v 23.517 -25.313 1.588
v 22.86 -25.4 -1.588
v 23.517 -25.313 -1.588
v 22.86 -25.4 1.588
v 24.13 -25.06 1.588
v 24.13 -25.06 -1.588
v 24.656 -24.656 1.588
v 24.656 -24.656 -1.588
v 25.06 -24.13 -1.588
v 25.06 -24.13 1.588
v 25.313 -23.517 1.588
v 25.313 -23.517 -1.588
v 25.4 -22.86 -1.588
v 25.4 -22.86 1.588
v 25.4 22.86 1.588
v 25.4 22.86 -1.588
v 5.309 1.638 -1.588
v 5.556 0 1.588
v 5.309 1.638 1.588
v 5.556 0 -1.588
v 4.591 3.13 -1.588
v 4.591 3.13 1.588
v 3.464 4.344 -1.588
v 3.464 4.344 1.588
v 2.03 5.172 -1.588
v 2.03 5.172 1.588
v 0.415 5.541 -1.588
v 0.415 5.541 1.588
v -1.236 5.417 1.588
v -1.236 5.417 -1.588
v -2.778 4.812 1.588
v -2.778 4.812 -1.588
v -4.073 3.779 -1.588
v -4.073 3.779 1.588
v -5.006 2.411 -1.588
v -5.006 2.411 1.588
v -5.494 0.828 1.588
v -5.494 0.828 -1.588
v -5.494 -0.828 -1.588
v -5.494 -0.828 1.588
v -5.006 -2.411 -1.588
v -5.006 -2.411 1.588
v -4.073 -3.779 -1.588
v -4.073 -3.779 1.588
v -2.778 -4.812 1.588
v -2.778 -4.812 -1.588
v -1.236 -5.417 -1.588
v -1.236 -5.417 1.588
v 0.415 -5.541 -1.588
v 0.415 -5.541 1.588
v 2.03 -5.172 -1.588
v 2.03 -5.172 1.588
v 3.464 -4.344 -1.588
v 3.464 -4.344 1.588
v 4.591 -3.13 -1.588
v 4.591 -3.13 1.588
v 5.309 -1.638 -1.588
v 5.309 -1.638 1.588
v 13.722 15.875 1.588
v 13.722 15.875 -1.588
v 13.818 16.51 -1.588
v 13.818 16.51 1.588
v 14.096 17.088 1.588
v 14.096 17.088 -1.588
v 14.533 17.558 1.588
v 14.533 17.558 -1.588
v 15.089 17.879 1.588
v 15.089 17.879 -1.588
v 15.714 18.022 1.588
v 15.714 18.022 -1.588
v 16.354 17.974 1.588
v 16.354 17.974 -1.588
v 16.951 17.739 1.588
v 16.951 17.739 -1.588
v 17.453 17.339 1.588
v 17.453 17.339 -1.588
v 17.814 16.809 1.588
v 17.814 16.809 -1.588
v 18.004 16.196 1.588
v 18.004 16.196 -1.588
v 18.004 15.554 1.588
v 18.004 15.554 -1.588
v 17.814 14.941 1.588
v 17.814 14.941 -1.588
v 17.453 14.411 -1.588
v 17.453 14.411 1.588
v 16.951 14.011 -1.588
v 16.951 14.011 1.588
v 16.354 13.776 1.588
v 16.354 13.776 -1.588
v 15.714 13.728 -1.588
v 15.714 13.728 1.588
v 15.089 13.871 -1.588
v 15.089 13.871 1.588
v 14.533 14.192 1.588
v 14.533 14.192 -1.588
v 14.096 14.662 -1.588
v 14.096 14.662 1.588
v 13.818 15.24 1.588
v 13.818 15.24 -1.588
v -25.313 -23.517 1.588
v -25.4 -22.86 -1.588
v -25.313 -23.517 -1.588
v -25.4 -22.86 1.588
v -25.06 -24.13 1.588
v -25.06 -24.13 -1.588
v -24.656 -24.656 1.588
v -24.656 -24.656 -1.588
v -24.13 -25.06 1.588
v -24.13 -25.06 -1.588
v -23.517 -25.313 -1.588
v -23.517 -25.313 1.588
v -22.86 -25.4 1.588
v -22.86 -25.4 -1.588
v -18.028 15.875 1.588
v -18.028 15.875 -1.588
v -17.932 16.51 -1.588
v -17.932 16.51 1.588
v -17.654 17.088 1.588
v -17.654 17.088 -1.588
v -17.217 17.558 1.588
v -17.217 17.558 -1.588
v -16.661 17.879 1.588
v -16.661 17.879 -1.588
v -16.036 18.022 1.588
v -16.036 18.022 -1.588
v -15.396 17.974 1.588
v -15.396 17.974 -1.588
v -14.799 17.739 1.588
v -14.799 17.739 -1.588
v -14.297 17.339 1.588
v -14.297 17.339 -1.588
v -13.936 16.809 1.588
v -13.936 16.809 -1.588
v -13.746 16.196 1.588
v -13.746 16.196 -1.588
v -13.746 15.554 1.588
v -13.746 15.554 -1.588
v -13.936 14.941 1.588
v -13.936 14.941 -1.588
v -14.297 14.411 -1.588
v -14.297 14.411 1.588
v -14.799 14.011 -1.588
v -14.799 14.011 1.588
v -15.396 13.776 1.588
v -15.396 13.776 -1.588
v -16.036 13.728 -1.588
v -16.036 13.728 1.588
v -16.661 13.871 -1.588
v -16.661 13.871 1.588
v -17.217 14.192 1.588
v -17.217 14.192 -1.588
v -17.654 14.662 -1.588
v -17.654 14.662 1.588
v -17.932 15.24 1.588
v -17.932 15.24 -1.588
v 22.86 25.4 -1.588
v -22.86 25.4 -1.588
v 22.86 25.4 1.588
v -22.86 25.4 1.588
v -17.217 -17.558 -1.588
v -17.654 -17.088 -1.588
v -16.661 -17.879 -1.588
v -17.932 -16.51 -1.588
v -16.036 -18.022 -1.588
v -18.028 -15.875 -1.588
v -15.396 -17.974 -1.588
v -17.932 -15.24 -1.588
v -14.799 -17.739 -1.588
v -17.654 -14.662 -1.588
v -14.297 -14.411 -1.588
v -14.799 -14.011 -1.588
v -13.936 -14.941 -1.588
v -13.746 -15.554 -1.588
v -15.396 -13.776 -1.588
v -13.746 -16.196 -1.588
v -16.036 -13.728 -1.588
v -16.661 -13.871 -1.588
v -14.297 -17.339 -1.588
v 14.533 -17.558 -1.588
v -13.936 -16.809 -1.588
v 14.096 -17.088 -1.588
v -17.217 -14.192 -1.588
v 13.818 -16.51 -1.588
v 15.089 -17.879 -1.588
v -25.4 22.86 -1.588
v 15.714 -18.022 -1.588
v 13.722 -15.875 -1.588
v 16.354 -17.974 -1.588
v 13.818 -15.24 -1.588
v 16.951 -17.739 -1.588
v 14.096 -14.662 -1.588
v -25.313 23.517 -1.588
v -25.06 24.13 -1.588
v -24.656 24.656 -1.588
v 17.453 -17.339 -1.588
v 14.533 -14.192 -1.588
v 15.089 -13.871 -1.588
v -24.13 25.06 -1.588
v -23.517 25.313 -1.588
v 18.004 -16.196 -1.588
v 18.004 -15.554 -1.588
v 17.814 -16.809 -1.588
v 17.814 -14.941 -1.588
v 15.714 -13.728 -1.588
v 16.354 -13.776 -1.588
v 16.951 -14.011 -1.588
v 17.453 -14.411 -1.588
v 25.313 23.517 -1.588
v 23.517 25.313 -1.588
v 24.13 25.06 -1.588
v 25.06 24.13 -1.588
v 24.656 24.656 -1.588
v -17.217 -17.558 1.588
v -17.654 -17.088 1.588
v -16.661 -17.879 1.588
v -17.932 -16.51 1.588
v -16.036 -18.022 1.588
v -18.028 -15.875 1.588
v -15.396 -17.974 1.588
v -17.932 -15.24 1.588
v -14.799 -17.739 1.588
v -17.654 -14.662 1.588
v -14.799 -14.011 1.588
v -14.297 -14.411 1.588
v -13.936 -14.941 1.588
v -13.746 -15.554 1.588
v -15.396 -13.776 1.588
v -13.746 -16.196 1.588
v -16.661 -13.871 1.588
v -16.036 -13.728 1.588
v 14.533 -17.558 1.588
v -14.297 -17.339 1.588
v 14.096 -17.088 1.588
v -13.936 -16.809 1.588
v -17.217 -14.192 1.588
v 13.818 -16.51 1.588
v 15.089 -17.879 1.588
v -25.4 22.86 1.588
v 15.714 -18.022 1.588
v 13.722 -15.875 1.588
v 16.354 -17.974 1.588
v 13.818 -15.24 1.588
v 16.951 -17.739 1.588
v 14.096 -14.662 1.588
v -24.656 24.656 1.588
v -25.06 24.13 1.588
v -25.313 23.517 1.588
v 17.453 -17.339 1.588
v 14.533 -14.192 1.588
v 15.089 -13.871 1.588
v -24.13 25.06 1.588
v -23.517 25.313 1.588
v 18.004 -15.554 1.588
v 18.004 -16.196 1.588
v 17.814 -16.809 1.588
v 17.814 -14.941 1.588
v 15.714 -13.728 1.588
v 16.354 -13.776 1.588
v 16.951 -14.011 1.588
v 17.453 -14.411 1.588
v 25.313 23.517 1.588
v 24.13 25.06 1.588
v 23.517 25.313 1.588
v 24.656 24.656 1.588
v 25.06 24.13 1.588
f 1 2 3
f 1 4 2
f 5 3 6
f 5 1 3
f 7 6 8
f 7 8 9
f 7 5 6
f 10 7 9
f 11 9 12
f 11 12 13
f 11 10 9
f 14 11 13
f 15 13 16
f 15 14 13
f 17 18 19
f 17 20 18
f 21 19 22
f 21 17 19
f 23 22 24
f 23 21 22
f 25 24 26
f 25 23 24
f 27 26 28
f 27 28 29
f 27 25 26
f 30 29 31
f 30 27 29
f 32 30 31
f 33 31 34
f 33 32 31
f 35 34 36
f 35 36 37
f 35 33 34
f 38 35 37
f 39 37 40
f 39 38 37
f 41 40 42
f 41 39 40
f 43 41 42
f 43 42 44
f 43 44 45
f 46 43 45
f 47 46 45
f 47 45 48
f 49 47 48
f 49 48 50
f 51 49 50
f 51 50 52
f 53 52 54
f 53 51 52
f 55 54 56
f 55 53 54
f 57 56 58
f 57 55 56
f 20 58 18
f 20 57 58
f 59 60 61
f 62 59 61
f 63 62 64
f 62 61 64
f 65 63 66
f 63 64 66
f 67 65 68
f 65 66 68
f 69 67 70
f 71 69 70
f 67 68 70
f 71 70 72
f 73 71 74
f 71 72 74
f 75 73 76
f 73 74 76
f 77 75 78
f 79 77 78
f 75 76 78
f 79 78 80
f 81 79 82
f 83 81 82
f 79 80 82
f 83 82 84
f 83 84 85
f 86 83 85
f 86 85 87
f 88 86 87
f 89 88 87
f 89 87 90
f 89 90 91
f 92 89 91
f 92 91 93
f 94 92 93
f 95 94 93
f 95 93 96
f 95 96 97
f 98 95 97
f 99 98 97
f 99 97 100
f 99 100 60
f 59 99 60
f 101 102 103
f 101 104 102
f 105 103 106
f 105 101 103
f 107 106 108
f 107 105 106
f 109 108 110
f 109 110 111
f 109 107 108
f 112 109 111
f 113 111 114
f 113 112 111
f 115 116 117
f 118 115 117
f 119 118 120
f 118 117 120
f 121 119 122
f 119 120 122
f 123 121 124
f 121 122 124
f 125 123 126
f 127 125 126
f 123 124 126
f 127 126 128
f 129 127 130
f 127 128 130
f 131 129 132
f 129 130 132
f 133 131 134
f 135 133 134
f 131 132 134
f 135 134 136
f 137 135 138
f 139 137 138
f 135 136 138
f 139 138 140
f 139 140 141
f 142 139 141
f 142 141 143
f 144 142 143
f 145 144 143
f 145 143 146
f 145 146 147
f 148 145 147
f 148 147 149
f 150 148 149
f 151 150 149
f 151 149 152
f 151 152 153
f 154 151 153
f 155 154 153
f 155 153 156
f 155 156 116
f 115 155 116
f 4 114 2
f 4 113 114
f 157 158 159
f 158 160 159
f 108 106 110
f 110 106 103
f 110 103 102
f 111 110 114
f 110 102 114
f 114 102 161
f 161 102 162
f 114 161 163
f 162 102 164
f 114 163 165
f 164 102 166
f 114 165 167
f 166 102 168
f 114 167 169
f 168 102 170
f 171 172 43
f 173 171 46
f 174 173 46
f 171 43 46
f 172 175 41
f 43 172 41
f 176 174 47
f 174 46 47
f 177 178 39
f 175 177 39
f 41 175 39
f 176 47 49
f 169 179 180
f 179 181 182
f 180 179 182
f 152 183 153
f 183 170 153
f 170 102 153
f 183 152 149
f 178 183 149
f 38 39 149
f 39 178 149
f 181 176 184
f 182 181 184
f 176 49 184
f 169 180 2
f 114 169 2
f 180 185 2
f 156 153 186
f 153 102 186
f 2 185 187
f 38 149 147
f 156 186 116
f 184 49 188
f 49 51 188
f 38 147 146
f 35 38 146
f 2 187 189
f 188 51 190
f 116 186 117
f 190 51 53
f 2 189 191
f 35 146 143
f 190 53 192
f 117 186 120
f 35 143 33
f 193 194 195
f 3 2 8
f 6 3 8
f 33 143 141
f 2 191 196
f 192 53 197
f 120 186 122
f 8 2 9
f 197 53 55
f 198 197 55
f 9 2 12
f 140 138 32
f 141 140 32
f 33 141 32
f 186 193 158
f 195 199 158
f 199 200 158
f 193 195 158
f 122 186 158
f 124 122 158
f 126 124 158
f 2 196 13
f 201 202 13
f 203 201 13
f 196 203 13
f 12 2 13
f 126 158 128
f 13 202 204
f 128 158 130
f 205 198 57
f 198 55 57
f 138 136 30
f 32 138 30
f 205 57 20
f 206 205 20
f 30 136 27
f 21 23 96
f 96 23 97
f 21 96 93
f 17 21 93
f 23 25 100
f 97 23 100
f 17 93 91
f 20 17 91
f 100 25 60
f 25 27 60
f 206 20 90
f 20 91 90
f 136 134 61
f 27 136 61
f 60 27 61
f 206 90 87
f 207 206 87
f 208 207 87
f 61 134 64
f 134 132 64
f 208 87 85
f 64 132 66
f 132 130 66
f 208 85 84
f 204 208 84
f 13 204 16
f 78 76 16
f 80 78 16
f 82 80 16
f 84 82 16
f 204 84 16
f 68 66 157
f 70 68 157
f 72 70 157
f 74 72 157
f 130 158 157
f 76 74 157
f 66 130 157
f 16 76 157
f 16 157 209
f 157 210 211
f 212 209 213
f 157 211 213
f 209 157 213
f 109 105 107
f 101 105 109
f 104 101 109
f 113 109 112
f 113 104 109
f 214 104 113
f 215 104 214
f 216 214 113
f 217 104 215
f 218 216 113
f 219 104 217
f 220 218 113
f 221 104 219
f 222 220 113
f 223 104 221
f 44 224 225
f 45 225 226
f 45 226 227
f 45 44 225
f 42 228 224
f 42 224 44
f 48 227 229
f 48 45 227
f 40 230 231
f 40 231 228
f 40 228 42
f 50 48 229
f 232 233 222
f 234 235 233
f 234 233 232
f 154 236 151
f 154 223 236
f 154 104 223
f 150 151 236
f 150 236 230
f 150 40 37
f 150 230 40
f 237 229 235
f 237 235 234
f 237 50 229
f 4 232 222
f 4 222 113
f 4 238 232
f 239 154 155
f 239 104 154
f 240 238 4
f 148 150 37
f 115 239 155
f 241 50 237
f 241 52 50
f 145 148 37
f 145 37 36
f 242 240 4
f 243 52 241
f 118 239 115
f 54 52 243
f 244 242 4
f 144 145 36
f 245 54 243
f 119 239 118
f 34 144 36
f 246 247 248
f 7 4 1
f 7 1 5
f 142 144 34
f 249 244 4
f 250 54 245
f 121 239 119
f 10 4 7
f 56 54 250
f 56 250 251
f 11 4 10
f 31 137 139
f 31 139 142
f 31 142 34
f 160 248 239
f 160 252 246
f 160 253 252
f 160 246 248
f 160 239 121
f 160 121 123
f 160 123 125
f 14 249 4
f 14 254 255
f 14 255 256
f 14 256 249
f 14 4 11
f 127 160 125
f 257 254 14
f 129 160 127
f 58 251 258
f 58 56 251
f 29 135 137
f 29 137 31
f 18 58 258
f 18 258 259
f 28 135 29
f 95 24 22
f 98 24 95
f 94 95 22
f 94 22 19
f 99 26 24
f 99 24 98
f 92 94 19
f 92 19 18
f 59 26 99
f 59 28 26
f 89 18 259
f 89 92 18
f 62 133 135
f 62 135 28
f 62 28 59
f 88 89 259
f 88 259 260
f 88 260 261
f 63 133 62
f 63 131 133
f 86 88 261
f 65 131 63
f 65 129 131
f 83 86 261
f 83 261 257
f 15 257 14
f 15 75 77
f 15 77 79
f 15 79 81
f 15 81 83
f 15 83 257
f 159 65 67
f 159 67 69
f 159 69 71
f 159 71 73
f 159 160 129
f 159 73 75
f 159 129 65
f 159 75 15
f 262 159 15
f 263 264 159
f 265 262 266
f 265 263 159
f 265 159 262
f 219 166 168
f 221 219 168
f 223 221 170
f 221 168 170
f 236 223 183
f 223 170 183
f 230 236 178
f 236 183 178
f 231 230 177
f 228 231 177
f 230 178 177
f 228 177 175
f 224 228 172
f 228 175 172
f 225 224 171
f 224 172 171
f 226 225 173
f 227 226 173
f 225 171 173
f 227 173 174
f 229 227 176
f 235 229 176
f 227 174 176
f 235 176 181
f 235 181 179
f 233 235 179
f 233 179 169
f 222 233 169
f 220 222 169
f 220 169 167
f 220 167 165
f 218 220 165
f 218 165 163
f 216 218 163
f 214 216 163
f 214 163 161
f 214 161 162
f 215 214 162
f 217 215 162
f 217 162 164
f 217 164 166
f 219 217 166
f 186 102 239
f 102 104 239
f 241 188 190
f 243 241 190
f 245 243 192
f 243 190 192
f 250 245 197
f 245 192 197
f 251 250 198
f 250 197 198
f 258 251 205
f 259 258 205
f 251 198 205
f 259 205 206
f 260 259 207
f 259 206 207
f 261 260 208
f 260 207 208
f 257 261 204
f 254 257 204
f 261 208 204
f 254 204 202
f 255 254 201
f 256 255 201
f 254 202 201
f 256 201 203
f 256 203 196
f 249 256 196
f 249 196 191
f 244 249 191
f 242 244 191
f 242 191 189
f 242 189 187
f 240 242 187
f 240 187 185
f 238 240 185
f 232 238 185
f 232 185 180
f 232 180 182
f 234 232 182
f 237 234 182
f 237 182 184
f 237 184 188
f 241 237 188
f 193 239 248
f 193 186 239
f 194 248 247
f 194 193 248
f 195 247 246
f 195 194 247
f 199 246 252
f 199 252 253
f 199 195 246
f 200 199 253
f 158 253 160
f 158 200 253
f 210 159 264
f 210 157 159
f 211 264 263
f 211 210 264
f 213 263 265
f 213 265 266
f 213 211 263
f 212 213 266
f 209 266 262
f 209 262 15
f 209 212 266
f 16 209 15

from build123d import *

# Parameters (mm, degrees)
SKETCH1_W             = 50.8
SKETCH1_H             = 50.8
SKETCH1_R             = 5.55625
BOSS_EXTRUDE1_DEPTH   = 1.5875
F_8_CLEARANCE_HOLE1_D = 4.3053
FILLET1_R             = 2.54


with BuildPart() as part:
    # Sketch1 → Boss-Extrude1 (new, symmetric)
    with BuildSketch(Plane.XY):
        Rectangle(SKETCH1_W, SKETCH1_H)
        Circle(SKETCH1_R, mode=Mode.SUBTRACT)
    extrude(amount=BOSS_EXTRUDE1_DEPTH, both=True)

    # #8 Clearance Hole1 (through all)
    with Locations(Plane.XY.offset(1.5875)):
        with Locations((-15.875, 15.875), (15.875, 15.875), (15.875, -15.875), (-15.875, -15.875), (0, 0)):
            Hole(F_8_CLEARANCE_HOLE1_D / 2)

    # Fillet1
    fillet1_edges = [part.edges().sort_by_distance(p)[0] for p in [
        (25.4, -25.4, 0),
        (-25.4, -25.4, 0),
        (-25.4, 25.4, 0),
        (25.4, 25.4, 0),
    ]]
    fillet(fillet1_edges, radius=FILLET1_R)


solid = part.part
